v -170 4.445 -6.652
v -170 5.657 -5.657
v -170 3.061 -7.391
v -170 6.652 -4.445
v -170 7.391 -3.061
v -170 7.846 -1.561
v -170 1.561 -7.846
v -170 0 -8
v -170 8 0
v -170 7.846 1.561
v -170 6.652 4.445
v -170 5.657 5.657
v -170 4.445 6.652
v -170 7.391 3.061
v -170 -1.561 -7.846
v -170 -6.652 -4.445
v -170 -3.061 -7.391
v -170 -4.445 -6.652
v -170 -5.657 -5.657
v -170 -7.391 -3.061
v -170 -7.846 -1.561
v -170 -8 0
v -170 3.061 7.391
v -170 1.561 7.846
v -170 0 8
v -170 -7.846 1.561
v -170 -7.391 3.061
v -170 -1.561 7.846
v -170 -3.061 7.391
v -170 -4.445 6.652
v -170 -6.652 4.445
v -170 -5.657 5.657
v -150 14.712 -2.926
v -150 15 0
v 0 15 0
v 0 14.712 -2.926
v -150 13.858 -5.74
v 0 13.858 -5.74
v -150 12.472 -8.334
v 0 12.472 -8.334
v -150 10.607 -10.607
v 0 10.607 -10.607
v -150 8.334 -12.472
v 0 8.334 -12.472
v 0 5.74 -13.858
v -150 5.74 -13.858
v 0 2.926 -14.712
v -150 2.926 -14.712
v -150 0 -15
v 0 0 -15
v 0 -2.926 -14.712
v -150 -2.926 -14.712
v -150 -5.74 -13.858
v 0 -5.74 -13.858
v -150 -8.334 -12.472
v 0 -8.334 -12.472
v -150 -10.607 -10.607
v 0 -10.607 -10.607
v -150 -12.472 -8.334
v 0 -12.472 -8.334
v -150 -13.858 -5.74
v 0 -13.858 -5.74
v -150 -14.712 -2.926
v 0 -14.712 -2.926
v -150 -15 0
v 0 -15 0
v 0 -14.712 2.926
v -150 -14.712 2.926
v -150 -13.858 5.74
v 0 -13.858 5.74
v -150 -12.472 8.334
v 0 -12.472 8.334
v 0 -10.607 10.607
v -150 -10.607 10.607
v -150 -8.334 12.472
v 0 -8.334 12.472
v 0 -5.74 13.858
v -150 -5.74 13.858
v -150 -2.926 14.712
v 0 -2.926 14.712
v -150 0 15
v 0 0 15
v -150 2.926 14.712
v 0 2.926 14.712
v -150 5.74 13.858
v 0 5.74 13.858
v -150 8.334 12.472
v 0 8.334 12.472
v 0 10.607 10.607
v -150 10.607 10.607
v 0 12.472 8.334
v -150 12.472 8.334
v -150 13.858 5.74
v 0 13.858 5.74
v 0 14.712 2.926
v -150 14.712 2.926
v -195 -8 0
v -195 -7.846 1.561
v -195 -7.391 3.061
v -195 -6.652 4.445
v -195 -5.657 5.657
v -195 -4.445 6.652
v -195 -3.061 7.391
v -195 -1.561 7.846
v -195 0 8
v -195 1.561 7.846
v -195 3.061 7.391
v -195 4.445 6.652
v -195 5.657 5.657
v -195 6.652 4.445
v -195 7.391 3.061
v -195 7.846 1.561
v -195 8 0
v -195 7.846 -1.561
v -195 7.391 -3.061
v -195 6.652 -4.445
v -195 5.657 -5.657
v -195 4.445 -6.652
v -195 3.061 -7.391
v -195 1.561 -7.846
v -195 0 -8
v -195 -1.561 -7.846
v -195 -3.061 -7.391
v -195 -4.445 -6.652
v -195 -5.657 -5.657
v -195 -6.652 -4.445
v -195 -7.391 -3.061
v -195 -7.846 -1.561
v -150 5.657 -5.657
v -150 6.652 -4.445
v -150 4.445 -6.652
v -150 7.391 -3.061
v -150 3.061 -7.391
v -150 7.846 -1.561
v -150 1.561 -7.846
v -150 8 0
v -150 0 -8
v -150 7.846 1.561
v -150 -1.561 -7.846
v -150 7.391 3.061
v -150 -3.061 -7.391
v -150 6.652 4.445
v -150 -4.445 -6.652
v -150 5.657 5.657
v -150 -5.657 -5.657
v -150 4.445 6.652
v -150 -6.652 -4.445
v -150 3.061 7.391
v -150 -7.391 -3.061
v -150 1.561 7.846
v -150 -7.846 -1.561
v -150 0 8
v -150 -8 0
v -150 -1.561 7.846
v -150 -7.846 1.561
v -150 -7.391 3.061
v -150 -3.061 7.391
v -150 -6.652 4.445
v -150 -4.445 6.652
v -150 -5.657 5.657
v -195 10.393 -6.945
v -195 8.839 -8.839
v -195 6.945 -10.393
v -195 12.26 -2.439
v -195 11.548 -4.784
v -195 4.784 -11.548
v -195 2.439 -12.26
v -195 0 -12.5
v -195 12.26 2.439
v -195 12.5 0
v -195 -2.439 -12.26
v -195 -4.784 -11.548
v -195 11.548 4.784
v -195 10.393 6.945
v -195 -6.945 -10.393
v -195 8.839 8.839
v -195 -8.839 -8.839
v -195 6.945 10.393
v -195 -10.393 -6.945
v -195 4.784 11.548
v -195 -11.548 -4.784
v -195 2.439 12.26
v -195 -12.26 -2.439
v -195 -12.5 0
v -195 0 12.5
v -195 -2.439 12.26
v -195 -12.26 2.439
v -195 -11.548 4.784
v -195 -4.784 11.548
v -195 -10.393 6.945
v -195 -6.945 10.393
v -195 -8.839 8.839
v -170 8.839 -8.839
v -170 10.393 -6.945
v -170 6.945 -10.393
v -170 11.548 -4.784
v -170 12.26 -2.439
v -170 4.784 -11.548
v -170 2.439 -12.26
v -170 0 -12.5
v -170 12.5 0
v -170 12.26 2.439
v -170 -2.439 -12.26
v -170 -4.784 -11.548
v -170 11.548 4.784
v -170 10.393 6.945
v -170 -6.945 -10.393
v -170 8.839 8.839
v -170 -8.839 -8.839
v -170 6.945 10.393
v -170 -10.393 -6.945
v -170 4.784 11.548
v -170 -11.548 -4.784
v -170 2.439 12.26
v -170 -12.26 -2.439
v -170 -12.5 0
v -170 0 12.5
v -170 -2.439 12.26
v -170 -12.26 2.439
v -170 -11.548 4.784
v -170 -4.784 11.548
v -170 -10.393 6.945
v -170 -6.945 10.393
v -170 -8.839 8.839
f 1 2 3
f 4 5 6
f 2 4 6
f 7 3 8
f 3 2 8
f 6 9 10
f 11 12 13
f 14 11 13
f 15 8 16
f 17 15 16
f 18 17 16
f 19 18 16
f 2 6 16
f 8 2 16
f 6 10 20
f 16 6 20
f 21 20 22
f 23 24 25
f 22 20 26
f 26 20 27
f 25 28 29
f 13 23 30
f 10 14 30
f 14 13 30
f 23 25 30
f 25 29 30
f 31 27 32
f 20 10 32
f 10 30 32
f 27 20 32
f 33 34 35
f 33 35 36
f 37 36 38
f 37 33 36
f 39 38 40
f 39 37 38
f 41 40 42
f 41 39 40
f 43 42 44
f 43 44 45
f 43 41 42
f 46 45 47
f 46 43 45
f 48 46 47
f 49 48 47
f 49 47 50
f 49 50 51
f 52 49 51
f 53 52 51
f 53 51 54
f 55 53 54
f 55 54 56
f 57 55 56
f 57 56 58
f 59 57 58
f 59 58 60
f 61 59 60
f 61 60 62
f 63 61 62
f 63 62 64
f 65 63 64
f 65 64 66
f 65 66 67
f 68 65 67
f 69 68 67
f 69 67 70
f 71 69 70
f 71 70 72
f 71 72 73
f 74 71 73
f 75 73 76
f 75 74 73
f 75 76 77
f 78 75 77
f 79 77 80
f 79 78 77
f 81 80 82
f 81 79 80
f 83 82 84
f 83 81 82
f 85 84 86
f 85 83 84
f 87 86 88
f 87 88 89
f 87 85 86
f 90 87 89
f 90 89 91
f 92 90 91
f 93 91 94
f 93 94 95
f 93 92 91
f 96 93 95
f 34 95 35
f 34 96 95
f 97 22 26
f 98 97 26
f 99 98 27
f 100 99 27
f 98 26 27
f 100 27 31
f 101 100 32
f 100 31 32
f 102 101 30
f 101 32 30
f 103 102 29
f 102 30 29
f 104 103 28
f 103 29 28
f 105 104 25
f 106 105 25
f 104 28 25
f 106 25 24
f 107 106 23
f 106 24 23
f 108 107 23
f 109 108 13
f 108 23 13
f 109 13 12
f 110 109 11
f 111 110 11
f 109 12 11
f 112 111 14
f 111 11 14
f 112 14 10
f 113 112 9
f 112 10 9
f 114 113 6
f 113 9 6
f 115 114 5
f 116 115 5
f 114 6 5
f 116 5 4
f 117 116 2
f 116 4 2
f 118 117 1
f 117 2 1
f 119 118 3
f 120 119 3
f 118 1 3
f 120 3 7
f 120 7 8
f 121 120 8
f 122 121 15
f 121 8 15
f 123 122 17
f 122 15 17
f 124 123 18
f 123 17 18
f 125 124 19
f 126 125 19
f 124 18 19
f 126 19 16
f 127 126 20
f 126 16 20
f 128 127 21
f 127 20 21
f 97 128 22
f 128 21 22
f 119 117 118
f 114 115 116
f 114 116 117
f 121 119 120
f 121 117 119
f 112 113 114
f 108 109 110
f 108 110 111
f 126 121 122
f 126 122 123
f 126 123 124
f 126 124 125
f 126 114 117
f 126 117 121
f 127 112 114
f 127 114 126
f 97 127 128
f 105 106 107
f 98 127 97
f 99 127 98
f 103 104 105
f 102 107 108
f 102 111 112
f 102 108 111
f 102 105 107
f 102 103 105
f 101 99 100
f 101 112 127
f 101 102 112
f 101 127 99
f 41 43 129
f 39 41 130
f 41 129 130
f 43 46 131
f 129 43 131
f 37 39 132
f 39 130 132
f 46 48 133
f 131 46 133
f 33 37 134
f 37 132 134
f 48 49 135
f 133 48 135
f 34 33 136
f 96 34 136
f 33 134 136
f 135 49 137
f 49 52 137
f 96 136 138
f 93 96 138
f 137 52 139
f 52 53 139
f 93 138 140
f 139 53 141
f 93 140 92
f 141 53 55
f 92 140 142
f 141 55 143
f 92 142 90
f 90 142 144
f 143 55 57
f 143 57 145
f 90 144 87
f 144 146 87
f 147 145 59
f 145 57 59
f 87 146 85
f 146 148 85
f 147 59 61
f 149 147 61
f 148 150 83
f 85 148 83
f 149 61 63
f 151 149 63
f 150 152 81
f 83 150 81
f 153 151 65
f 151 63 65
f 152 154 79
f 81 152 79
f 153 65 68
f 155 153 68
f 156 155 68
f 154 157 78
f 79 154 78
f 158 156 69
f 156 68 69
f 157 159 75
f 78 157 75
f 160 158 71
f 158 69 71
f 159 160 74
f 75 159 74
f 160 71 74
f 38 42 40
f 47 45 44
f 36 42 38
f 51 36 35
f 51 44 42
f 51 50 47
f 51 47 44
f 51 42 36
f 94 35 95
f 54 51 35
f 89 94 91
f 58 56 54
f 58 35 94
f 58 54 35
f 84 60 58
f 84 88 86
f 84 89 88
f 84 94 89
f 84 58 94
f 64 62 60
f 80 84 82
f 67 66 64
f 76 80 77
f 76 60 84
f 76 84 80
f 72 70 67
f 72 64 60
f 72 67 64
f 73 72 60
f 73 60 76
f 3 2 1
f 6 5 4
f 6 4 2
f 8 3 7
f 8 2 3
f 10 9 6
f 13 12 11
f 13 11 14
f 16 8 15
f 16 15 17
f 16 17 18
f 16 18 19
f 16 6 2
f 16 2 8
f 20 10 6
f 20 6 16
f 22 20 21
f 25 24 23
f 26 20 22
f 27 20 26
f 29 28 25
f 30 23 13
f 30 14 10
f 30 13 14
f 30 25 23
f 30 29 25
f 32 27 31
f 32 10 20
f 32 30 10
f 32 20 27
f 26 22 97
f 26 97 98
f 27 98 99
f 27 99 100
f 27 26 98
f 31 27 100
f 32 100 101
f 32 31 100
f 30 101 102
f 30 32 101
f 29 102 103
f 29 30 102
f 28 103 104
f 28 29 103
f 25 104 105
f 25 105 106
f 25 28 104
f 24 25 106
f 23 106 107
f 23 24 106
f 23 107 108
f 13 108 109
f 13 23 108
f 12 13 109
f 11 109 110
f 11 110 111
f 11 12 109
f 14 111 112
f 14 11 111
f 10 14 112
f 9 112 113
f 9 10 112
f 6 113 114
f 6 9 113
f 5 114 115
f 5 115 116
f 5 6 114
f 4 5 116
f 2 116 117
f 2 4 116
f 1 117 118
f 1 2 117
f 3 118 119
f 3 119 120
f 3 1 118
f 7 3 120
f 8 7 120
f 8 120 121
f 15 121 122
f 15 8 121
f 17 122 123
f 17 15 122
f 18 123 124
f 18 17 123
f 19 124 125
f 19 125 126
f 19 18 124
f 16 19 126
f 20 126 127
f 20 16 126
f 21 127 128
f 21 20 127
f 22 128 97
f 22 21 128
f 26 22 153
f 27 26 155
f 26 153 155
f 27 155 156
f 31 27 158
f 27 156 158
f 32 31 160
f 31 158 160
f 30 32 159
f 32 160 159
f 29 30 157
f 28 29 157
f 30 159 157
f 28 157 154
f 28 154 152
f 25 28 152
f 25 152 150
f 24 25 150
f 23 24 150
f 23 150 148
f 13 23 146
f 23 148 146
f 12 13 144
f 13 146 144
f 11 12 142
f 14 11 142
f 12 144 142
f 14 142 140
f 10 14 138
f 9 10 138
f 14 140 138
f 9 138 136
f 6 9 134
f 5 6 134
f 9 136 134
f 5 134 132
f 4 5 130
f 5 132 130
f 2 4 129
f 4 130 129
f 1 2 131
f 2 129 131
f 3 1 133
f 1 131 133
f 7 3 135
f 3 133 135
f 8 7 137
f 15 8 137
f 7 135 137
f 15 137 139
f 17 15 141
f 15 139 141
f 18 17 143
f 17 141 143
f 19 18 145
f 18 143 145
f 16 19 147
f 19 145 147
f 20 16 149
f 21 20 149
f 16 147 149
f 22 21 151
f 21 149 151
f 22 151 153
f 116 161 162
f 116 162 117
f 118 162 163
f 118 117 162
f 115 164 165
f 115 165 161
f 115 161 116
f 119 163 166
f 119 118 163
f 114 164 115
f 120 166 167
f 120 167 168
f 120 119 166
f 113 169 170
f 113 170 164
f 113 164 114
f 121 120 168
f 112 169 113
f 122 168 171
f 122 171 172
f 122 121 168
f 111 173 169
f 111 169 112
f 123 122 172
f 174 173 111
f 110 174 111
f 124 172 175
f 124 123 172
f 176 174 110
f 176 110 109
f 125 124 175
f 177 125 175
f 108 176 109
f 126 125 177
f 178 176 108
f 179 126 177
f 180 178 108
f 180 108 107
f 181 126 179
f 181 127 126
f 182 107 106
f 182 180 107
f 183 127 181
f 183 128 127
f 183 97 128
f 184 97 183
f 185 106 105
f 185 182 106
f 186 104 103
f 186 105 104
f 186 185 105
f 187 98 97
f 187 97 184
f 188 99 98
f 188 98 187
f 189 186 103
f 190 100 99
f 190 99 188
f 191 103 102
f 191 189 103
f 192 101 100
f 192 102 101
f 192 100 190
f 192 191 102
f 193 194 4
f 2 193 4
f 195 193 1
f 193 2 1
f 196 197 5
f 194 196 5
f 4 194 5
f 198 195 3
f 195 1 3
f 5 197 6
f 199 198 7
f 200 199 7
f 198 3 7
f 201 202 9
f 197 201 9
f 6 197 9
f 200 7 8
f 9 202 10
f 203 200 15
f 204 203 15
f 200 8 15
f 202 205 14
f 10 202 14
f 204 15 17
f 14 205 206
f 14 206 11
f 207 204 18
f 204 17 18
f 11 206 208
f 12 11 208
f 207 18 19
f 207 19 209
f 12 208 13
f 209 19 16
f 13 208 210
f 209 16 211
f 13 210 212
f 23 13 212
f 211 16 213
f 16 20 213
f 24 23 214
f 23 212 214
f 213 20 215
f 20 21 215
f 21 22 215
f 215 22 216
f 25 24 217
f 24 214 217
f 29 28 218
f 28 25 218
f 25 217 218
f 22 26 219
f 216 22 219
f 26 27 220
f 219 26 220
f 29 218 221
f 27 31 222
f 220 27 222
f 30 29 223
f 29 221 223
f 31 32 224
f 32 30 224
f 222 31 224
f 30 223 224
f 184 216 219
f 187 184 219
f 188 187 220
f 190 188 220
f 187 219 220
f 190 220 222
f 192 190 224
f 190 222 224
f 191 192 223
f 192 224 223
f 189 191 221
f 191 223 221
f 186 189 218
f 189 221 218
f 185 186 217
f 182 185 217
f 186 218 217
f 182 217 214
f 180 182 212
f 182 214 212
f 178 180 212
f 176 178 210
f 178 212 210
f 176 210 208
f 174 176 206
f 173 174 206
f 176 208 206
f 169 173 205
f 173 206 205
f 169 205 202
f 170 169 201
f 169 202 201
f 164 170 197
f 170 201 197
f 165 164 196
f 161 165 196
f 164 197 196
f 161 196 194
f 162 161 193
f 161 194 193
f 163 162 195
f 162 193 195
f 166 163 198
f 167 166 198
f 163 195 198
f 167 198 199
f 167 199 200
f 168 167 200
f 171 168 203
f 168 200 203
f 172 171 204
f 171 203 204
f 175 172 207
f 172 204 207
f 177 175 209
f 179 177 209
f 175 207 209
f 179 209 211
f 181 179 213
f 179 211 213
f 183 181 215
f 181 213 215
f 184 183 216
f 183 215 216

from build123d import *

# Parameters (mm, degrees)
F1_R      = 15
F3_R      = 8
F4_DEPTH  = 20
F5_R      = 12.5
F5_R_2    = 8
F6_DEPTH  = 25
F4_FACE_R = 8
F7_DEPTH  = 25


with BuildPart() as f2:
    # F2: sweep along a path in F0
    with BuildLine(Plane.XY) as f2_path:
        Line((0, 0), (-150, 0))
    # F1 (on Right) → F2 (sweep)
    with BuildSketch(Plane.YZ):
        Circle(F1_R)
    sweep(path=f2_path.line)

    # F3 (on face) → F4 (join)
    with BuildSketch(Plane(origin=(-150, 0, 0), x_dir=(0, -1, 0), z_dir=(-1, 0, 0))):
        Circle(F3_R)
    extrude(amount=F4_DEPTH)


with BuildPart() as f6:
    # F5 (on face) → F6 (new body)
    with BuildSketch(Plane(origin=(-170, 0, 0), x_dir=(0, -1, 0), z_dir=(-1, 0, 0))):
        Circle(F5_R)
        Circle(F5_R_2, mode=Mode.SUBTRACT)
    extrude(amount=F6_DEPTH)


with BuildPart() as f7:
    # F4_face (on face) → F7 (new body)
    with BuildSketch(Plane(origin=(-170, 0, 0), x_dir=(0, -1, 0), z_dir=(-1, 0, 0))):
        Circle(F4_FACE_R)
    extrude(amount=F7_DEPTH)


solid = Compound([f2.part, f6.part, f7.part])
